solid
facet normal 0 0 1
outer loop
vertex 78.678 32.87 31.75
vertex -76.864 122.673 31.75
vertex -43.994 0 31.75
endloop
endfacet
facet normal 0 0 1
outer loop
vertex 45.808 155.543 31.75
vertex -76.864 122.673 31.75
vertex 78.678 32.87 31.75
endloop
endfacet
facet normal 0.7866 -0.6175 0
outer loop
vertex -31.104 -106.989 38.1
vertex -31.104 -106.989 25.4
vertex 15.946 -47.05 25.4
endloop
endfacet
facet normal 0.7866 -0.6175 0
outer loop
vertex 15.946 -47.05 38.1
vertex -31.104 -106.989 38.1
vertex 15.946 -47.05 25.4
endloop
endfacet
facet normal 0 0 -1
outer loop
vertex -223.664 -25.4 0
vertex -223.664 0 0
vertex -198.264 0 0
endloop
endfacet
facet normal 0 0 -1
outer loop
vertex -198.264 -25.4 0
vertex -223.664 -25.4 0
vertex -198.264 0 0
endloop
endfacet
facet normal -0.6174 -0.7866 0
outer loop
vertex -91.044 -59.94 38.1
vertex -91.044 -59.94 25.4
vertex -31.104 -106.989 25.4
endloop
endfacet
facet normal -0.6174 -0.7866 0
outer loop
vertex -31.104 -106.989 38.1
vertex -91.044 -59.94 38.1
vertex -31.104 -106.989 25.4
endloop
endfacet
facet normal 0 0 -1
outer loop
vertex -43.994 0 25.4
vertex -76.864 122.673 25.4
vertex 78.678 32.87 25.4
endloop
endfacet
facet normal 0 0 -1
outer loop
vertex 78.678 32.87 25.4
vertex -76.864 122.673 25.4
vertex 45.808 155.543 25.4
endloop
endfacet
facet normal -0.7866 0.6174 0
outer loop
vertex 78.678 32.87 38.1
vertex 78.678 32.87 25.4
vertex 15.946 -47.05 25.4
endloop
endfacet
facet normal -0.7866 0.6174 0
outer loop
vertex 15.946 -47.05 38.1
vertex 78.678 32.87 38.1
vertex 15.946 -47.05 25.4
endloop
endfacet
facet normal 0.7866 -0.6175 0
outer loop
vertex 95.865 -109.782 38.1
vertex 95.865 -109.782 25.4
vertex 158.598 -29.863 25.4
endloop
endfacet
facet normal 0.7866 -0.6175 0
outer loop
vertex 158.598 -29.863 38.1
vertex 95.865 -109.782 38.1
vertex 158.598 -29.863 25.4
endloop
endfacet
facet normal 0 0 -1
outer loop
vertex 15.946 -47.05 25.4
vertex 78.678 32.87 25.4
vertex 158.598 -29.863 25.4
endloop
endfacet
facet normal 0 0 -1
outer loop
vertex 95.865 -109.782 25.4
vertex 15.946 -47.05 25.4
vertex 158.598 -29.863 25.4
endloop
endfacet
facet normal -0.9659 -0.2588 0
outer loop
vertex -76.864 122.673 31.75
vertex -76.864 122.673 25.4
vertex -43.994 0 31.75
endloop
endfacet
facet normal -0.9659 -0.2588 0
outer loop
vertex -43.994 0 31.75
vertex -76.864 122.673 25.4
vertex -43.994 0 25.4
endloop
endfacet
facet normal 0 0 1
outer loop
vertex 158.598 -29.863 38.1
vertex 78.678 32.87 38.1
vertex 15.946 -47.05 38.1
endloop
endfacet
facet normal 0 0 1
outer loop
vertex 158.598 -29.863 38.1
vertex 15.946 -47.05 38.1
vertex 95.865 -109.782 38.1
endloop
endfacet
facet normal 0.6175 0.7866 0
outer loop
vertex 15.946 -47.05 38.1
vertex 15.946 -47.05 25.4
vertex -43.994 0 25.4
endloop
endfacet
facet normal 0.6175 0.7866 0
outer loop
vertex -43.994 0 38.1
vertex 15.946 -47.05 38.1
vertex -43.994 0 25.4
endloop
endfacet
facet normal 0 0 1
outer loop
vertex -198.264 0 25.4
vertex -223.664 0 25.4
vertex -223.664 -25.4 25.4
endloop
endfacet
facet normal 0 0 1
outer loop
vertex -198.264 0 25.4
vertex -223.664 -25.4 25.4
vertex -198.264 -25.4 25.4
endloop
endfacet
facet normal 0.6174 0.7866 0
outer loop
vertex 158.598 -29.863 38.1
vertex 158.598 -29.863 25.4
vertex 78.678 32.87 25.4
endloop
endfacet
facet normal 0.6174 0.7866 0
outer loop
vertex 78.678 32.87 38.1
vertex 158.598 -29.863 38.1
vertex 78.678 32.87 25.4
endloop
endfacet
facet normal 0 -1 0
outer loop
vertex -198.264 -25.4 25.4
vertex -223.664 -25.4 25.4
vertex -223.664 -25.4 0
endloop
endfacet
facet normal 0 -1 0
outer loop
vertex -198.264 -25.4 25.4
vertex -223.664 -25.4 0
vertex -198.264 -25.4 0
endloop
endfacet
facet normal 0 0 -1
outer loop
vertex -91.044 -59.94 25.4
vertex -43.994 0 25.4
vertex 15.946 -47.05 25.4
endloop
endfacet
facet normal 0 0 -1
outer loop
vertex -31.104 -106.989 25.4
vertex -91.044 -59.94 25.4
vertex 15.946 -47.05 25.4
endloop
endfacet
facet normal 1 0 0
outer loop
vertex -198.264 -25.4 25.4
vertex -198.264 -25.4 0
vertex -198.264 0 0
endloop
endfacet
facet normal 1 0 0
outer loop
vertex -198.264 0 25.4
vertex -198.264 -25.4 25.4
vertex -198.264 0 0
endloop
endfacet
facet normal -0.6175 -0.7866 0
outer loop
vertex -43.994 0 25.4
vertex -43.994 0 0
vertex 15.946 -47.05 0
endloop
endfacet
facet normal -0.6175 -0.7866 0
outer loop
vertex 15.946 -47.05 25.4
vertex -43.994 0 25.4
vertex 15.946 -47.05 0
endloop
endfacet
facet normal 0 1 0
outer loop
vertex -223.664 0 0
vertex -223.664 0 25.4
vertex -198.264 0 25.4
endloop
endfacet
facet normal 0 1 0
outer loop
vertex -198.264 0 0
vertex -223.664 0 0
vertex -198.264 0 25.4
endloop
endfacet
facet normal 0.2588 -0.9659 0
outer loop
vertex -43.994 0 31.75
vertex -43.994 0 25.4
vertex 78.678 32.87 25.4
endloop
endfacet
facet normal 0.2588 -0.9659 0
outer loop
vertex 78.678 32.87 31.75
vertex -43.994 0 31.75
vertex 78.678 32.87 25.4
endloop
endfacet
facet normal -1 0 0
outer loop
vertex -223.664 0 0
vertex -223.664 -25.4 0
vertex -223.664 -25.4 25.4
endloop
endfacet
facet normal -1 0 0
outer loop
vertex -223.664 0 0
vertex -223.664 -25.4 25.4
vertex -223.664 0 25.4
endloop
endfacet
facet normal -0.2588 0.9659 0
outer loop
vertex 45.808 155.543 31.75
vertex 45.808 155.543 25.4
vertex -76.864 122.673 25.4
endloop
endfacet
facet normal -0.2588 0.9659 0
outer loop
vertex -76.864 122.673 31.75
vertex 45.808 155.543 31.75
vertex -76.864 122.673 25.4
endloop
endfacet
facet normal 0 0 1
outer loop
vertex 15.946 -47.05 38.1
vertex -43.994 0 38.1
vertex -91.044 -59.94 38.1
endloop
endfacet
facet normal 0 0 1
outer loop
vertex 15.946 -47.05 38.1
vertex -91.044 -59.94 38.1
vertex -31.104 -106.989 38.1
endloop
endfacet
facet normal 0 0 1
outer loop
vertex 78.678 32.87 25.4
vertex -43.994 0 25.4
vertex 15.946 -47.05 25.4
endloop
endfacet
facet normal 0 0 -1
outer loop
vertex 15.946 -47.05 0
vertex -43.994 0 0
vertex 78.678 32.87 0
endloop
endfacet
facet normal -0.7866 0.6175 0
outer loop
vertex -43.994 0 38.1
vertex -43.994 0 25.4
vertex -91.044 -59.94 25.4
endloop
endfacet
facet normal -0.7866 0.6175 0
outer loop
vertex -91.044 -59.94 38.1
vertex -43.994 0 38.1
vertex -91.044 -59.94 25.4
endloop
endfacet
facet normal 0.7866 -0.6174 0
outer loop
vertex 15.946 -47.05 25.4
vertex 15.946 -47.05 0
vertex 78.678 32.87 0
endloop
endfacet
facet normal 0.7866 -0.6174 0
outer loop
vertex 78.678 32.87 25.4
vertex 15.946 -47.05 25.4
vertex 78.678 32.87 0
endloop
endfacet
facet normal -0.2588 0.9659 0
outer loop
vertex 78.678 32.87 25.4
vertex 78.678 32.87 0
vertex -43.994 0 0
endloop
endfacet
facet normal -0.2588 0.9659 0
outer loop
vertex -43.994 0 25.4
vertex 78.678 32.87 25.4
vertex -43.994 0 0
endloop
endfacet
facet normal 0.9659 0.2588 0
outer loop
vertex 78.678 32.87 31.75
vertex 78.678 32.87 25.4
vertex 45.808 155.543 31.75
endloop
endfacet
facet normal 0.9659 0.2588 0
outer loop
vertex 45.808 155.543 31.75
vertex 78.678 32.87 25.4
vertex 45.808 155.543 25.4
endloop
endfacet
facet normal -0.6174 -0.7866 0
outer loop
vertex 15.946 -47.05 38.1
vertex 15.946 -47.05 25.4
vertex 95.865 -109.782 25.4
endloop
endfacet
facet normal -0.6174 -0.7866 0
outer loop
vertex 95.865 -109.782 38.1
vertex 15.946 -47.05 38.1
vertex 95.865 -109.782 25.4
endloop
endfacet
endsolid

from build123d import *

# Parameters (mm, degrees)
F1_DEPTH = 25.4
F4_DEPTH = 12.7
F6_DEPTH = 6.35
F7_W     = 25.4
F7_H     = 25.4
F8_DEPTH = 25.4


with BuildPart() as f1:
    # F0 (on Top) → F1 (new body)
    with BuildSketch(Plane.XY):
        Polygon((15.945647, -47.049632), (78.678489, 32.870019), (-43.994091, 0), align=None)
    extrude(amount=F1_DEPTH)


with BuildPart() as f4:
    # F2 (on face) + F3 (on face) → F4 (new body)
    with BuildSketch(Plane.XY.offset(25.4)):
        Polygon((15.945647, -47.049632), (-43.994091, 0), (-91.043722, -59.939738), (-31.103984, -106.989369), align=None)
    with BuildSketch(Plane.XY.offset(25.4)):
        Polygon((158.59814, -29.862823), (78.678489, 32.870019), (15.945647, -47.049632), (95.865298, -109.782474), align=None)
    extrude(amount=F4_DEPTH)


with BuildPart() as f6:
    # F5 (on face) → F6 (new body)
    with BuildSketch(Plane.XY.offset(25.4)):
        Polygon((-76.864109, 122.67258), (-43.994091, 0), (78.678489, 32.870019), (45.808471, 155.542599), align=None)
    extrude(amount=F6_DEPTH)


with BuildPart() as f8:
    # F7 (on Top) → F8 (new body)
    with BuildSketch(Plane.XY):
        with Locations((-210.964285, -12.7)):
            Rectangle(F7_W, F7_H)
    extrude(amount=F8_DEPTH)


solid = Compound([f1.part, f4.part, f6.part, f8.part])
